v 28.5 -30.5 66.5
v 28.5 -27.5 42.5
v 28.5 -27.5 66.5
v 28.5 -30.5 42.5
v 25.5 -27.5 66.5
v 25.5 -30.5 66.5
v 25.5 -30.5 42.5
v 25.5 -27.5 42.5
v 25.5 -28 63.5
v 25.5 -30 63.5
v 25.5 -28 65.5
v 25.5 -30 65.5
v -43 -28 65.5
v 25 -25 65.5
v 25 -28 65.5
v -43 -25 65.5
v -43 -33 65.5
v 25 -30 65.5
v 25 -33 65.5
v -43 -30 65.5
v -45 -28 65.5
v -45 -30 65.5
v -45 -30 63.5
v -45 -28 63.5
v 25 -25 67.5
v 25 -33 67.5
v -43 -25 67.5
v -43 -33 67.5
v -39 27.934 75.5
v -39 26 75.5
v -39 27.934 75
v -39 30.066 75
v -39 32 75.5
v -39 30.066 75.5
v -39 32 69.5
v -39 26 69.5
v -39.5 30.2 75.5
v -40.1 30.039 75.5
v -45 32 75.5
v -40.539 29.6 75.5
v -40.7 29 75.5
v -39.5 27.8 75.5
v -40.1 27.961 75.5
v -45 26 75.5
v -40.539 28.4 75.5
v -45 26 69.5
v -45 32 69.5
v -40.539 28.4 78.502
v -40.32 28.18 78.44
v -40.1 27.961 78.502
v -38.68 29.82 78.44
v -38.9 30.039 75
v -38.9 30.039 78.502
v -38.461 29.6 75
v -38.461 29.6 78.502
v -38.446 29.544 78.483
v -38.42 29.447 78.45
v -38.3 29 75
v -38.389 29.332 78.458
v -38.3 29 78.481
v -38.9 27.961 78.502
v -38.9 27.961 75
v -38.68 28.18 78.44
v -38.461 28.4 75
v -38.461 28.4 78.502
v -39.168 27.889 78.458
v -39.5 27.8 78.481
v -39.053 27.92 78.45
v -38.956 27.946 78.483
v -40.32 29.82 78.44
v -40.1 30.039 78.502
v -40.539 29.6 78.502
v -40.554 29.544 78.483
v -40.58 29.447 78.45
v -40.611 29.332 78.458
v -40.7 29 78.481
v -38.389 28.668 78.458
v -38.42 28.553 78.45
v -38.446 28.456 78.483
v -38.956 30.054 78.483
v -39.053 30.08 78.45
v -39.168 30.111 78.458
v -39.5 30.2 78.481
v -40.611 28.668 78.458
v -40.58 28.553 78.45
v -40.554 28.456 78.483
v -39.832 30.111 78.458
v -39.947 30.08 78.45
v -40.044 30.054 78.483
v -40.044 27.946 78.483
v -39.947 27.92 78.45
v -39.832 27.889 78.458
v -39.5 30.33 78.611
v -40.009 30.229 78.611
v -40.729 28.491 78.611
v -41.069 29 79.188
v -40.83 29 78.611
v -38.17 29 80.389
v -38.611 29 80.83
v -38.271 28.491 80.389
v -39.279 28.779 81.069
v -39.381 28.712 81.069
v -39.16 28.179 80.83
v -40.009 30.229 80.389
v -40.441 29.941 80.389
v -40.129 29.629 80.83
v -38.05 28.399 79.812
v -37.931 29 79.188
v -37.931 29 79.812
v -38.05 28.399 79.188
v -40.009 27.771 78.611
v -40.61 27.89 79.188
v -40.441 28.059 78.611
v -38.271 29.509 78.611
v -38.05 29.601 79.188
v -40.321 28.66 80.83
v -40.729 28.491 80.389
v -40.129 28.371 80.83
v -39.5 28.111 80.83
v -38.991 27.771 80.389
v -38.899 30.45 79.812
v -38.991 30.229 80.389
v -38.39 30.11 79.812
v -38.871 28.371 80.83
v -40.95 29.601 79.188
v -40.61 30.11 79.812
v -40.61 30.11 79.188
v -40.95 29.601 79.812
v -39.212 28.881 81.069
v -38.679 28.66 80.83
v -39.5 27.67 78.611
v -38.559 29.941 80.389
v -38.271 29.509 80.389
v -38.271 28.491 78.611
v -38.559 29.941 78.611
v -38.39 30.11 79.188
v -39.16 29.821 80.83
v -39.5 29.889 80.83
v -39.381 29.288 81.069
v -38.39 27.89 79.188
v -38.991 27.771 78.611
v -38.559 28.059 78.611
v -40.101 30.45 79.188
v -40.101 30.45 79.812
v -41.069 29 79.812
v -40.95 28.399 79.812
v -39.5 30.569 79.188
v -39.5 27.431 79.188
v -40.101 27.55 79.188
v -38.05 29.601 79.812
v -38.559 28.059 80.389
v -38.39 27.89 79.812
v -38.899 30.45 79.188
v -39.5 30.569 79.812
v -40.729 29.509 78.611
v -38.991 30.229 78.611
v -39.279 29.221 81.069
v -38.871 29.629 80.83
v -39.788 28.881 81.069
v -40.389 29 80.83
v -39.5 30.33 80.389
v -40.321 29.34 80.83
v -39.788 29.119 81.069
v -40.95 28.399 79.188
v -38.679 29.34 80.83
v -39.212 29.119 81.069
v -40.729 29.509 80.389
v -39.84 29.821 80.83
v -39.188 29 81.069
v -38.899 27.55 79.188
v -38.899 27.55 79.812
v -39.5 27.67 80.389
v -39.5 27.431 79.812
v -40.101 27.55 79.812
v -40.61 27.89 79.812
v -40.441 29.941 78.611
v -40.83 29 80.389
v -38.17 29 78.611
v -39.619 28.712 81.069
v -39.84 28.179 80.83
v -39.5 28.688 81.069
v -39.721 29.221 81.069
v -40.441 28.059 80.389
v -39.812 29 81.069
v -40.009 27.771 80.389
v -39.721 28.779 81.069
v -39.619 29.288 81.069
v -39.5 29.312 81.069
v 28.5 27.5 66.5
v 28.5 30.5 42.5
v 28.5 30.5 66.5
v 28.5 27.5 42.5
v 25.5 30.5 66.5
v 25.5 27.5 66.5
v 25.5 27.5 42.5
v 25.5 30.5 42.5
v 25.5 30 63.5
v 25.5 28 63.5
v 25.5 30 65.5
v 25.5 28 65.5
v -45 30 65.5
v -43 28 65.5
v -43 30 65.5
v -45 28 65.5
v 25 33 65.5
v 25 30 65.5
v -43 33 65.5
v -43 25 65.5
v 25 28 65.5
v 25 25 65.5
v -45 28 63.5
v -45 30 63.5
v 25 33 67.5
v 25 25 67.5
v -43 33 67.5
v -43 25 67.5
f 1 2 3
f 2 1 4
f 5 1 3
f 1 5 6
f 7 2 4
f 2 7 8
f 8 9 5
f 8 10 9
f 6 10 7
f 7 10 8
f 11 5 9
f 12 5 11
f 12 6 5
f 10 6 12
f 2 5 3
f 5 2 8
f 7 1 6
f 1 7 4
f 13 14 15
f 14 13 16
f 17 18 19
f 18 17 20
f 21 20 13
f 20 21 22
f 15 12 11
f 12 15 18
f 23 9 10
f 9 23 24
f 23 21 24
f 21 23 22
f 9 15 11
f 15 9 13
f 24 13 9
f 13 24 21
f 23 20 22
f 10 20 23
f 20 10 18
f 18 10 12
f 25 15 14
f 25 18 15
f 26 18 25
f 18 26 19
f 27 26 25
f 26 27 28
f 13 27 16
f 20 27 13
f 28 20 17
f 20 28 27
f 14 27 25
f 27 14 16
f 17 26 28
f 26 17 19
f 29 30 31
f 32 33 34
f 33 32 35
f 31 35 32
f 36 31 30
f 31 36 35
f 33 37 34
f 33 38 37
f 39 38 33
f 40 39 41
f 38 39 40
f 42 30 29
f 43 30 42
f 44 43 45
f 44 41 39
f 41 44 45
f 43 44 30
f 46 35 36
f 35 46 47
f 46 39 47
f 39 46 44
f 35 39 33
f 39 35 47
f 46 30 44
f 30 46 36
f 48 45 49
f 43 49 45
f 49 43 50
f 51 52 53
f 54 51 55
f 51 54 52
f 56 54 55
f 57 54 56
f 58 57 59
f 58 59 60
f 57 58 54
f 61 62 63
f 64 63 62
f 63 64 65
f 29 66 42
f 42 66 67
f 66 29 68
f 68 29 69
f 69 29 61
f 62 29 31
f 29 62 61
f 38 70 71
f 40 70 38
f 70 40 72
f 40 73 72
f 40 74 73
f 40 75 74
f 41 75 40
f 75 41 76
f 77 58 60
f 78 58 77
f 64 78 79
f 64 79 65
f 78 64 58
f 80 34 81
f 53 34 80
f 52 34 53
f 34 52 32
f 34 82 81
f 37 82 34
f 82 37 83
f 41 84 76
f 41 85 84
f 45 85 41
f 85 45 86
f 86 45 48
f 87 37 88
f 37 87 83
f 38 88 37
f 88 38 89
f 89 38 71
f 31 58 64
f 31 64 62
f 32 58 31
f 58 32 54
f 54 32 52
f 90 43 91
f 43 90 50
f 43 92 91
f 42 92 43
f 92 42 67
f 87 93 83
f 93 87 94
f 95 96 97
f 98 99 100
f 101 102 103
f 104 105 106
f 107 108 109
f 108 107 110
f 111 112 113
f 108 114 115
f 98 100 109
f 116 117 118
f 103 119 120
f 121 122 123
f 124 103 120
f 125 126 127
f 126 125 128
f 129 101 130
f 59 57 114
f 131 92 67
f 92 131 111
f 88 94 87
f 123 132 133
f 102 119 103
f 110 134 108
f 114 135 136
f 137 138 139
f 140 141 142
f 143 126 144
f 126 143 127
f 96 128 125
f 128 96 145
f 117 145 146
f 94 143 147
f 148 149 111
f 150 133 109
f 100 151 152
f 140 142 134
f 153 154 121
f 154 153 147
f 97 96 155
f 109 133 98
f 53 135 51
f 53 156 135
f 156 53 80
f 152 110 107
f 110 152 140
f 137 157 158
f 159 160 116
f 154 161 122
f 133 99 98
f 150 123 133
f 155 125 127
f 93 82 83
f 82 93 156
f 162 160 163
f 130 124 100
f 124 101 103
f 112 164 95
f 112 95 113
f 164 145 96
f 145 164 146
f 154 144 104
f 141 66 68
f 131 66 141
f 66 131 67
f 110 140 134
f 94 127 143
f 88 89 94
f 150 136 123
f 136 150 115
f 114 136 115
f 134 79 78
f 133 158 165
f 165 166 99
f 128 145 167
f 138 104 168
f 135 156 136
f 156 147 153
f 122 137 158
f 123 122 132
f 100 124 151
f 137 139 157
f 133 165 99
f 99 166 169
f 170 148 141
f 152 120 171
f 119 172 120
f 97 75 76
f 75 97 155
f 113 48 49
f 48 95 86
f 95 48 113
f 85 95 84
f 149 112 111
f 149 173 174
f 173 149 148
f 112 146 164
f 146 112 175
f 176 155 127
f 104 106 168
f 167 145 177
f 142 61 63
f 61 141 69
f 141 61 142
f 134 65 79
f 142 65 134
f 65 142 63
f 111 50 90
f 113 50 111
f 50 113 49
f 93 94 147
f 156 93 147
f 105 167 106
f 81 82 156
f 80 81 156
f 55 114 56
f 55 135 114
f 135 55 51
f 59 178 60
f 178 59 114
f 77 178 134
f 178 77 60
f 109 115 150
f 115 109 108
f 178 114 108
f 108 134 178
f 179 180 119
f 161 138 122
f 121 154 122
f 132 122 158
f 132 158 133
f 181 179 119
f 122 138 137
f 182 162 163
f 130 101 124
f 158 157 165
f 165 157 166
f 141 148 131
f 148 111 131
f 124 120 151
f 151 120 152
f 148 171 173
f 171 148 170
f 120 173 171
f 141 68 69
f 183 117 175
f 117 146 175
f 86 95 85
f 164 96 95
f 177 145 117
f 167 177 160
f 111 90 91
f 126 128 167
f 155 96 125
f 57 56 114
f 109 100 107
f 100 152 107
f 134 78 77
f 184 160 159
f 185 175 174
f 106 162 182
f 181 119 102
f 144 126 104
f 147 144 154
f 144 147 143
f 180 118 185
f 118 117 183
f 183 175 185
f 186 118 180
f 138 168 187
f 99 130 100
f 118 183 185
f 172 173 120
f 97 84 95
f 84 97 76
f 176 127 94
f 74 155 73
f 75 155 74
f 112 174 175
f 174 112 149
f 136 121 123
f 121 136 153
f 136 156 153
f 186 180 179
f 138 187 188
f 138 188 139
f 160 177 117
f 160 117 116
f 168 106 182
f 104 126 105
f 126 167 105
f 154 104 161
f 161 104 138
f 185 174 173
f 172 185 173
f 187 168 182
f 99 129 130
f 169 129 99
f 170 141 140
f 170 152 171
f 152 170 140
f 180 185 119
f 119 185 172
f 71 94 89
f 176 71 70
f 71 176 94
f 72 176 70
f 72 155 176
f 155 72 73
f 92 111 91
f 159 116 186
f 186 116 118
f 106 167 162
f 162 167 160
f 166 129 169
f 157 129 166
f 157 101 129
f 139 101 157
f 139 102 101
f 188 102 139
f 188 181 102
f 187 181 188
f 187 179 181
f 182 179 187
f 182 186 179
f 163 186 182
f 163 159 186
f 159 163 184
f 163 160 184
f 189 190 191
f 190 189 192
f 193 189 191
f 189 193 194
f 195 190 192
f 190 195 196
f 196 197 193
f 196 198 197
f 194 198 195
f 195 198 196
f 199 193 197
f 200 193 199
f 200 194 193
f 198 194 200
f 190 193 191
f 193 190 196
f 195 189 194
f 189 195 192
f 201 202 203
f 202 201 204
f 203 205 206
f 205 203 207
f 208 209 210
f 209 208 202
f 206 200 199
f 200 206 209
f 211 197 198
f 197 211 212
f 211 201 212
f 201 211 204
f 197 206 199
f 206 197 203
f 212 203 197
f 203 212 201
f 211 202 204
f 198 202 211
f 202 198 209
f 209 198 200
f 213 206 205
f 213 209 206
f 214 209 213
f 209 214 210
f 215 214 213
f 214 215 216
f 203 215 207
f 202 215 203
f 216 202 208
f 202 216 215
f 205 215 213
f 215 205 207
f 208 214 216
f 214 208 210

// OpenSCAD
// file: utils.scad
include <parameters.scad>

module beamBetween(p1, p2, width, height) {
    dx = p2[0] - p1[0];
    dz = p2[2] - p1[2];
    length = sqrt(dx * dx + dz * dz);
    angle = atan2(dz, dx);

    translate([(p1[0] + p2[0]) / 2, (p1[1] + p2[1]) / 2, (p1[2] + p2[2]) / 2])
        rotate([0, -angle, 0])
            cube([length, width, height], center = true);
}
// file: armrest.scad
include <parameters.scad>
use <utils.scad>

//================ ARMRESTS =================//
// Full-length padded armrests. Aluminum construction with leather pads.

module armrestUnit(side) {
    y = side * (seatPanWidth / 2 - 4);
    padTopZ = armPadHeight;
    padZ = padTopZ - armPadThick / 2;
    baseZ = idlerZ + seatTopOffset - 5 - 2;
    padCX = armPivotX - armLength / 2 - 2;

    // Rear post — aluminum, rises at the seat back.
    color(matAluminum)
        translate([armPivotX, y, (baseZ + padZ) / 2])
            cube([3, 3, padZ - baseZ], center = true);

    // Horizontal rail — aluminum, from the post forward.
    color(matAluminum)
        translate([padCX, y, padZ - 2])
            cube([armLength + 4, 2, 2], center = true);

    // Padded top — leather.
    color(matLeather)
        translate([padCX, y, padTopZ - armPadThick / 2])
            cube([armLength, armPadWidth, 2], center = true);

    // Joystick on the front of the right armrest.
    if (side == 1) {
        jx = armPivotX - armLength - 1;
        color(matDarkSteel)
            translate([jx, y, padTopZ + 4])
                cube([6, 6, 6], center = true);
        color(matChrome)
            translate([jx + 2.5, y, padTopZ + 8.5])
                cylinder(r = 1.2, h = 4, center = true, $fn = 12);
        color(matRubber)
            translate([jx + 2.5, y, padTopZ + 11])
                sphere(r = 1.6, $fn = 16);
    }
}

module armrests() {
    armrestUnit(-1);
    armrestUnit(1);
}
// file: parameters.scad
// Shared parameters for tracked wheelchair prototype
// NOTE: 1 unit = 1 cm (seat target 450 mm = 45 units above ground).
$fn = 48;

//================ MATERIALS =================//
// Frame: aluminum 6061-T6 (lightweight)
// Seat: carbon fiber T700 + honeycomb (ultralight)
// Suspension: rubber bushings (lightweight)
// Axles: aluminum 7075-T6 (1/3 weight of steel)
matSteel      = [0.35, 0.36, 0.38];   // hardware / fasteners only
matDarkSteel  = [0.25, 0.26, 0.28];
matRubber     = [0.12, 0.12, 0.14];   // track belt + bushings
matAluminum   = [0.55, 0.57, 0.60];   // primary frame material
matChrome     = [0.70, 0.72, 0.75];
matCarbon     = [0.15, 0.15, 0.18];   // (unused — seat now aluminum)
matLeather    = [0.45, 0.25, 0.12];   // leather cushion color

//================ TRACKS =================//
trackLength = 82;
trackWidth = 14;
trackCenterY = 28;

idlerRadius = 10;
idlerX = trackLength / 2;
idlerZ = 16;
roadRadius = 7;
roadZ = 13;  // road wheels roll on the belt's inner surface (belt upper edge at this height)
roadPositions = [-22, -6, 10, 24];

linkLength = 10;
linkWidth = trackWidth + 2;
linkThickness = 3;
linkGap = 1;
// Belt centerline clears the idler wheels plus link half-thickness,
// so the links ride on the wheels instead of clipping through them.
trackRadius = idlerRadius + linkThickness / 2;  // = 11.5
beltThickness = 3;
groundZ = idlerZ - trackRadius;  // bottom of track = ground level (4.5)

//================ HYDRAULIC JACK WHEEL =================//
trackTilt = 0;
liftPivotX = idlerX;
liftPivotZ = idlerZ;
// Electric linear actuator (24V DC, 500kg, 300mm stroke).
// 1/3 weight of hydraulic system.
hydrWheelRadius = 4;
hydrWheelWidth = 10;
hydrBarrelRadius = 4;        // smaller barrel (mini actuator)
hydrBarrelHeight = 12;       // shorter barrel
hydrRodRadius = 2;
// At full extension the jack wheel rests on the ground:
// mountZ 35 - groundZ 4.5 - wheelR 4 = 26.5
hydrExtend = 26.5;
hydrRetracted = 0;
hydrExtendAmount = hydrExtend;
hydrMountX = 10;   // jack mount x; moved forward (from 24) for first-stair clearance
hydrMountY = 0;

//================ CHASSIS =================//
chassisLength = 82;
chassisBottom = 35;
chassisHeight = 12;

//================ SEAT =================//
// Seat geometry: flat aluminium pan + leather cushion + slim backrest.
// Seat surface rides at 450 mm (45 units) above the ground.
// topZ = idlerZ + seatTopOffset = 49.5, ground at 4.5 -> seat 45 above ground.
seatPanLength = 66;
seatPanWidth = 66;
backShellHeight = 72;
headrestHeight = 16;
seatTopOffset = 45 - trackRadius;  // = 33.5
// Backrest recline (deg from vertical).
seatBackRecline = 8;

//================ FOOTREST =================//
footrestWidth = 34;
footrestLength = 28;
footrestThickness = 3;       // 3mm aluminum plate
footrestHeight = idlerZ + 12;
footrestFrontX = -30 - footrestLength / 2;  // plate center, extends forward from arm end

// Folding footplate pivots at the end of the L-bracket arm.
footPivotX = -30;                           // end of L-bracket horizontal arm
footPivotZ = idlerZ + seatTopOffset - 7;    // arm height (panB - 2)
footHeelGuard = true;                       // optional heel guard
footToeGuard = false;                       // optional toe guard (off by default)

//================ ARMRESTS =================//
armPivotX = idlerX - 14;                     // rear post at the seat back
armLength = 68;                              // full-length pad (covers seat depth)
armPadHeight = idlerZ + seatTopOffset + 19;  // pad top = elbow height (~19 above seat top)
armPadWidth = 8;
armPadThick = 4;
// main file
// STL EXPORT: Armrest pair (left + right with joystick)
include <parameters.scad>
use <armrest.scad>
armrests();
